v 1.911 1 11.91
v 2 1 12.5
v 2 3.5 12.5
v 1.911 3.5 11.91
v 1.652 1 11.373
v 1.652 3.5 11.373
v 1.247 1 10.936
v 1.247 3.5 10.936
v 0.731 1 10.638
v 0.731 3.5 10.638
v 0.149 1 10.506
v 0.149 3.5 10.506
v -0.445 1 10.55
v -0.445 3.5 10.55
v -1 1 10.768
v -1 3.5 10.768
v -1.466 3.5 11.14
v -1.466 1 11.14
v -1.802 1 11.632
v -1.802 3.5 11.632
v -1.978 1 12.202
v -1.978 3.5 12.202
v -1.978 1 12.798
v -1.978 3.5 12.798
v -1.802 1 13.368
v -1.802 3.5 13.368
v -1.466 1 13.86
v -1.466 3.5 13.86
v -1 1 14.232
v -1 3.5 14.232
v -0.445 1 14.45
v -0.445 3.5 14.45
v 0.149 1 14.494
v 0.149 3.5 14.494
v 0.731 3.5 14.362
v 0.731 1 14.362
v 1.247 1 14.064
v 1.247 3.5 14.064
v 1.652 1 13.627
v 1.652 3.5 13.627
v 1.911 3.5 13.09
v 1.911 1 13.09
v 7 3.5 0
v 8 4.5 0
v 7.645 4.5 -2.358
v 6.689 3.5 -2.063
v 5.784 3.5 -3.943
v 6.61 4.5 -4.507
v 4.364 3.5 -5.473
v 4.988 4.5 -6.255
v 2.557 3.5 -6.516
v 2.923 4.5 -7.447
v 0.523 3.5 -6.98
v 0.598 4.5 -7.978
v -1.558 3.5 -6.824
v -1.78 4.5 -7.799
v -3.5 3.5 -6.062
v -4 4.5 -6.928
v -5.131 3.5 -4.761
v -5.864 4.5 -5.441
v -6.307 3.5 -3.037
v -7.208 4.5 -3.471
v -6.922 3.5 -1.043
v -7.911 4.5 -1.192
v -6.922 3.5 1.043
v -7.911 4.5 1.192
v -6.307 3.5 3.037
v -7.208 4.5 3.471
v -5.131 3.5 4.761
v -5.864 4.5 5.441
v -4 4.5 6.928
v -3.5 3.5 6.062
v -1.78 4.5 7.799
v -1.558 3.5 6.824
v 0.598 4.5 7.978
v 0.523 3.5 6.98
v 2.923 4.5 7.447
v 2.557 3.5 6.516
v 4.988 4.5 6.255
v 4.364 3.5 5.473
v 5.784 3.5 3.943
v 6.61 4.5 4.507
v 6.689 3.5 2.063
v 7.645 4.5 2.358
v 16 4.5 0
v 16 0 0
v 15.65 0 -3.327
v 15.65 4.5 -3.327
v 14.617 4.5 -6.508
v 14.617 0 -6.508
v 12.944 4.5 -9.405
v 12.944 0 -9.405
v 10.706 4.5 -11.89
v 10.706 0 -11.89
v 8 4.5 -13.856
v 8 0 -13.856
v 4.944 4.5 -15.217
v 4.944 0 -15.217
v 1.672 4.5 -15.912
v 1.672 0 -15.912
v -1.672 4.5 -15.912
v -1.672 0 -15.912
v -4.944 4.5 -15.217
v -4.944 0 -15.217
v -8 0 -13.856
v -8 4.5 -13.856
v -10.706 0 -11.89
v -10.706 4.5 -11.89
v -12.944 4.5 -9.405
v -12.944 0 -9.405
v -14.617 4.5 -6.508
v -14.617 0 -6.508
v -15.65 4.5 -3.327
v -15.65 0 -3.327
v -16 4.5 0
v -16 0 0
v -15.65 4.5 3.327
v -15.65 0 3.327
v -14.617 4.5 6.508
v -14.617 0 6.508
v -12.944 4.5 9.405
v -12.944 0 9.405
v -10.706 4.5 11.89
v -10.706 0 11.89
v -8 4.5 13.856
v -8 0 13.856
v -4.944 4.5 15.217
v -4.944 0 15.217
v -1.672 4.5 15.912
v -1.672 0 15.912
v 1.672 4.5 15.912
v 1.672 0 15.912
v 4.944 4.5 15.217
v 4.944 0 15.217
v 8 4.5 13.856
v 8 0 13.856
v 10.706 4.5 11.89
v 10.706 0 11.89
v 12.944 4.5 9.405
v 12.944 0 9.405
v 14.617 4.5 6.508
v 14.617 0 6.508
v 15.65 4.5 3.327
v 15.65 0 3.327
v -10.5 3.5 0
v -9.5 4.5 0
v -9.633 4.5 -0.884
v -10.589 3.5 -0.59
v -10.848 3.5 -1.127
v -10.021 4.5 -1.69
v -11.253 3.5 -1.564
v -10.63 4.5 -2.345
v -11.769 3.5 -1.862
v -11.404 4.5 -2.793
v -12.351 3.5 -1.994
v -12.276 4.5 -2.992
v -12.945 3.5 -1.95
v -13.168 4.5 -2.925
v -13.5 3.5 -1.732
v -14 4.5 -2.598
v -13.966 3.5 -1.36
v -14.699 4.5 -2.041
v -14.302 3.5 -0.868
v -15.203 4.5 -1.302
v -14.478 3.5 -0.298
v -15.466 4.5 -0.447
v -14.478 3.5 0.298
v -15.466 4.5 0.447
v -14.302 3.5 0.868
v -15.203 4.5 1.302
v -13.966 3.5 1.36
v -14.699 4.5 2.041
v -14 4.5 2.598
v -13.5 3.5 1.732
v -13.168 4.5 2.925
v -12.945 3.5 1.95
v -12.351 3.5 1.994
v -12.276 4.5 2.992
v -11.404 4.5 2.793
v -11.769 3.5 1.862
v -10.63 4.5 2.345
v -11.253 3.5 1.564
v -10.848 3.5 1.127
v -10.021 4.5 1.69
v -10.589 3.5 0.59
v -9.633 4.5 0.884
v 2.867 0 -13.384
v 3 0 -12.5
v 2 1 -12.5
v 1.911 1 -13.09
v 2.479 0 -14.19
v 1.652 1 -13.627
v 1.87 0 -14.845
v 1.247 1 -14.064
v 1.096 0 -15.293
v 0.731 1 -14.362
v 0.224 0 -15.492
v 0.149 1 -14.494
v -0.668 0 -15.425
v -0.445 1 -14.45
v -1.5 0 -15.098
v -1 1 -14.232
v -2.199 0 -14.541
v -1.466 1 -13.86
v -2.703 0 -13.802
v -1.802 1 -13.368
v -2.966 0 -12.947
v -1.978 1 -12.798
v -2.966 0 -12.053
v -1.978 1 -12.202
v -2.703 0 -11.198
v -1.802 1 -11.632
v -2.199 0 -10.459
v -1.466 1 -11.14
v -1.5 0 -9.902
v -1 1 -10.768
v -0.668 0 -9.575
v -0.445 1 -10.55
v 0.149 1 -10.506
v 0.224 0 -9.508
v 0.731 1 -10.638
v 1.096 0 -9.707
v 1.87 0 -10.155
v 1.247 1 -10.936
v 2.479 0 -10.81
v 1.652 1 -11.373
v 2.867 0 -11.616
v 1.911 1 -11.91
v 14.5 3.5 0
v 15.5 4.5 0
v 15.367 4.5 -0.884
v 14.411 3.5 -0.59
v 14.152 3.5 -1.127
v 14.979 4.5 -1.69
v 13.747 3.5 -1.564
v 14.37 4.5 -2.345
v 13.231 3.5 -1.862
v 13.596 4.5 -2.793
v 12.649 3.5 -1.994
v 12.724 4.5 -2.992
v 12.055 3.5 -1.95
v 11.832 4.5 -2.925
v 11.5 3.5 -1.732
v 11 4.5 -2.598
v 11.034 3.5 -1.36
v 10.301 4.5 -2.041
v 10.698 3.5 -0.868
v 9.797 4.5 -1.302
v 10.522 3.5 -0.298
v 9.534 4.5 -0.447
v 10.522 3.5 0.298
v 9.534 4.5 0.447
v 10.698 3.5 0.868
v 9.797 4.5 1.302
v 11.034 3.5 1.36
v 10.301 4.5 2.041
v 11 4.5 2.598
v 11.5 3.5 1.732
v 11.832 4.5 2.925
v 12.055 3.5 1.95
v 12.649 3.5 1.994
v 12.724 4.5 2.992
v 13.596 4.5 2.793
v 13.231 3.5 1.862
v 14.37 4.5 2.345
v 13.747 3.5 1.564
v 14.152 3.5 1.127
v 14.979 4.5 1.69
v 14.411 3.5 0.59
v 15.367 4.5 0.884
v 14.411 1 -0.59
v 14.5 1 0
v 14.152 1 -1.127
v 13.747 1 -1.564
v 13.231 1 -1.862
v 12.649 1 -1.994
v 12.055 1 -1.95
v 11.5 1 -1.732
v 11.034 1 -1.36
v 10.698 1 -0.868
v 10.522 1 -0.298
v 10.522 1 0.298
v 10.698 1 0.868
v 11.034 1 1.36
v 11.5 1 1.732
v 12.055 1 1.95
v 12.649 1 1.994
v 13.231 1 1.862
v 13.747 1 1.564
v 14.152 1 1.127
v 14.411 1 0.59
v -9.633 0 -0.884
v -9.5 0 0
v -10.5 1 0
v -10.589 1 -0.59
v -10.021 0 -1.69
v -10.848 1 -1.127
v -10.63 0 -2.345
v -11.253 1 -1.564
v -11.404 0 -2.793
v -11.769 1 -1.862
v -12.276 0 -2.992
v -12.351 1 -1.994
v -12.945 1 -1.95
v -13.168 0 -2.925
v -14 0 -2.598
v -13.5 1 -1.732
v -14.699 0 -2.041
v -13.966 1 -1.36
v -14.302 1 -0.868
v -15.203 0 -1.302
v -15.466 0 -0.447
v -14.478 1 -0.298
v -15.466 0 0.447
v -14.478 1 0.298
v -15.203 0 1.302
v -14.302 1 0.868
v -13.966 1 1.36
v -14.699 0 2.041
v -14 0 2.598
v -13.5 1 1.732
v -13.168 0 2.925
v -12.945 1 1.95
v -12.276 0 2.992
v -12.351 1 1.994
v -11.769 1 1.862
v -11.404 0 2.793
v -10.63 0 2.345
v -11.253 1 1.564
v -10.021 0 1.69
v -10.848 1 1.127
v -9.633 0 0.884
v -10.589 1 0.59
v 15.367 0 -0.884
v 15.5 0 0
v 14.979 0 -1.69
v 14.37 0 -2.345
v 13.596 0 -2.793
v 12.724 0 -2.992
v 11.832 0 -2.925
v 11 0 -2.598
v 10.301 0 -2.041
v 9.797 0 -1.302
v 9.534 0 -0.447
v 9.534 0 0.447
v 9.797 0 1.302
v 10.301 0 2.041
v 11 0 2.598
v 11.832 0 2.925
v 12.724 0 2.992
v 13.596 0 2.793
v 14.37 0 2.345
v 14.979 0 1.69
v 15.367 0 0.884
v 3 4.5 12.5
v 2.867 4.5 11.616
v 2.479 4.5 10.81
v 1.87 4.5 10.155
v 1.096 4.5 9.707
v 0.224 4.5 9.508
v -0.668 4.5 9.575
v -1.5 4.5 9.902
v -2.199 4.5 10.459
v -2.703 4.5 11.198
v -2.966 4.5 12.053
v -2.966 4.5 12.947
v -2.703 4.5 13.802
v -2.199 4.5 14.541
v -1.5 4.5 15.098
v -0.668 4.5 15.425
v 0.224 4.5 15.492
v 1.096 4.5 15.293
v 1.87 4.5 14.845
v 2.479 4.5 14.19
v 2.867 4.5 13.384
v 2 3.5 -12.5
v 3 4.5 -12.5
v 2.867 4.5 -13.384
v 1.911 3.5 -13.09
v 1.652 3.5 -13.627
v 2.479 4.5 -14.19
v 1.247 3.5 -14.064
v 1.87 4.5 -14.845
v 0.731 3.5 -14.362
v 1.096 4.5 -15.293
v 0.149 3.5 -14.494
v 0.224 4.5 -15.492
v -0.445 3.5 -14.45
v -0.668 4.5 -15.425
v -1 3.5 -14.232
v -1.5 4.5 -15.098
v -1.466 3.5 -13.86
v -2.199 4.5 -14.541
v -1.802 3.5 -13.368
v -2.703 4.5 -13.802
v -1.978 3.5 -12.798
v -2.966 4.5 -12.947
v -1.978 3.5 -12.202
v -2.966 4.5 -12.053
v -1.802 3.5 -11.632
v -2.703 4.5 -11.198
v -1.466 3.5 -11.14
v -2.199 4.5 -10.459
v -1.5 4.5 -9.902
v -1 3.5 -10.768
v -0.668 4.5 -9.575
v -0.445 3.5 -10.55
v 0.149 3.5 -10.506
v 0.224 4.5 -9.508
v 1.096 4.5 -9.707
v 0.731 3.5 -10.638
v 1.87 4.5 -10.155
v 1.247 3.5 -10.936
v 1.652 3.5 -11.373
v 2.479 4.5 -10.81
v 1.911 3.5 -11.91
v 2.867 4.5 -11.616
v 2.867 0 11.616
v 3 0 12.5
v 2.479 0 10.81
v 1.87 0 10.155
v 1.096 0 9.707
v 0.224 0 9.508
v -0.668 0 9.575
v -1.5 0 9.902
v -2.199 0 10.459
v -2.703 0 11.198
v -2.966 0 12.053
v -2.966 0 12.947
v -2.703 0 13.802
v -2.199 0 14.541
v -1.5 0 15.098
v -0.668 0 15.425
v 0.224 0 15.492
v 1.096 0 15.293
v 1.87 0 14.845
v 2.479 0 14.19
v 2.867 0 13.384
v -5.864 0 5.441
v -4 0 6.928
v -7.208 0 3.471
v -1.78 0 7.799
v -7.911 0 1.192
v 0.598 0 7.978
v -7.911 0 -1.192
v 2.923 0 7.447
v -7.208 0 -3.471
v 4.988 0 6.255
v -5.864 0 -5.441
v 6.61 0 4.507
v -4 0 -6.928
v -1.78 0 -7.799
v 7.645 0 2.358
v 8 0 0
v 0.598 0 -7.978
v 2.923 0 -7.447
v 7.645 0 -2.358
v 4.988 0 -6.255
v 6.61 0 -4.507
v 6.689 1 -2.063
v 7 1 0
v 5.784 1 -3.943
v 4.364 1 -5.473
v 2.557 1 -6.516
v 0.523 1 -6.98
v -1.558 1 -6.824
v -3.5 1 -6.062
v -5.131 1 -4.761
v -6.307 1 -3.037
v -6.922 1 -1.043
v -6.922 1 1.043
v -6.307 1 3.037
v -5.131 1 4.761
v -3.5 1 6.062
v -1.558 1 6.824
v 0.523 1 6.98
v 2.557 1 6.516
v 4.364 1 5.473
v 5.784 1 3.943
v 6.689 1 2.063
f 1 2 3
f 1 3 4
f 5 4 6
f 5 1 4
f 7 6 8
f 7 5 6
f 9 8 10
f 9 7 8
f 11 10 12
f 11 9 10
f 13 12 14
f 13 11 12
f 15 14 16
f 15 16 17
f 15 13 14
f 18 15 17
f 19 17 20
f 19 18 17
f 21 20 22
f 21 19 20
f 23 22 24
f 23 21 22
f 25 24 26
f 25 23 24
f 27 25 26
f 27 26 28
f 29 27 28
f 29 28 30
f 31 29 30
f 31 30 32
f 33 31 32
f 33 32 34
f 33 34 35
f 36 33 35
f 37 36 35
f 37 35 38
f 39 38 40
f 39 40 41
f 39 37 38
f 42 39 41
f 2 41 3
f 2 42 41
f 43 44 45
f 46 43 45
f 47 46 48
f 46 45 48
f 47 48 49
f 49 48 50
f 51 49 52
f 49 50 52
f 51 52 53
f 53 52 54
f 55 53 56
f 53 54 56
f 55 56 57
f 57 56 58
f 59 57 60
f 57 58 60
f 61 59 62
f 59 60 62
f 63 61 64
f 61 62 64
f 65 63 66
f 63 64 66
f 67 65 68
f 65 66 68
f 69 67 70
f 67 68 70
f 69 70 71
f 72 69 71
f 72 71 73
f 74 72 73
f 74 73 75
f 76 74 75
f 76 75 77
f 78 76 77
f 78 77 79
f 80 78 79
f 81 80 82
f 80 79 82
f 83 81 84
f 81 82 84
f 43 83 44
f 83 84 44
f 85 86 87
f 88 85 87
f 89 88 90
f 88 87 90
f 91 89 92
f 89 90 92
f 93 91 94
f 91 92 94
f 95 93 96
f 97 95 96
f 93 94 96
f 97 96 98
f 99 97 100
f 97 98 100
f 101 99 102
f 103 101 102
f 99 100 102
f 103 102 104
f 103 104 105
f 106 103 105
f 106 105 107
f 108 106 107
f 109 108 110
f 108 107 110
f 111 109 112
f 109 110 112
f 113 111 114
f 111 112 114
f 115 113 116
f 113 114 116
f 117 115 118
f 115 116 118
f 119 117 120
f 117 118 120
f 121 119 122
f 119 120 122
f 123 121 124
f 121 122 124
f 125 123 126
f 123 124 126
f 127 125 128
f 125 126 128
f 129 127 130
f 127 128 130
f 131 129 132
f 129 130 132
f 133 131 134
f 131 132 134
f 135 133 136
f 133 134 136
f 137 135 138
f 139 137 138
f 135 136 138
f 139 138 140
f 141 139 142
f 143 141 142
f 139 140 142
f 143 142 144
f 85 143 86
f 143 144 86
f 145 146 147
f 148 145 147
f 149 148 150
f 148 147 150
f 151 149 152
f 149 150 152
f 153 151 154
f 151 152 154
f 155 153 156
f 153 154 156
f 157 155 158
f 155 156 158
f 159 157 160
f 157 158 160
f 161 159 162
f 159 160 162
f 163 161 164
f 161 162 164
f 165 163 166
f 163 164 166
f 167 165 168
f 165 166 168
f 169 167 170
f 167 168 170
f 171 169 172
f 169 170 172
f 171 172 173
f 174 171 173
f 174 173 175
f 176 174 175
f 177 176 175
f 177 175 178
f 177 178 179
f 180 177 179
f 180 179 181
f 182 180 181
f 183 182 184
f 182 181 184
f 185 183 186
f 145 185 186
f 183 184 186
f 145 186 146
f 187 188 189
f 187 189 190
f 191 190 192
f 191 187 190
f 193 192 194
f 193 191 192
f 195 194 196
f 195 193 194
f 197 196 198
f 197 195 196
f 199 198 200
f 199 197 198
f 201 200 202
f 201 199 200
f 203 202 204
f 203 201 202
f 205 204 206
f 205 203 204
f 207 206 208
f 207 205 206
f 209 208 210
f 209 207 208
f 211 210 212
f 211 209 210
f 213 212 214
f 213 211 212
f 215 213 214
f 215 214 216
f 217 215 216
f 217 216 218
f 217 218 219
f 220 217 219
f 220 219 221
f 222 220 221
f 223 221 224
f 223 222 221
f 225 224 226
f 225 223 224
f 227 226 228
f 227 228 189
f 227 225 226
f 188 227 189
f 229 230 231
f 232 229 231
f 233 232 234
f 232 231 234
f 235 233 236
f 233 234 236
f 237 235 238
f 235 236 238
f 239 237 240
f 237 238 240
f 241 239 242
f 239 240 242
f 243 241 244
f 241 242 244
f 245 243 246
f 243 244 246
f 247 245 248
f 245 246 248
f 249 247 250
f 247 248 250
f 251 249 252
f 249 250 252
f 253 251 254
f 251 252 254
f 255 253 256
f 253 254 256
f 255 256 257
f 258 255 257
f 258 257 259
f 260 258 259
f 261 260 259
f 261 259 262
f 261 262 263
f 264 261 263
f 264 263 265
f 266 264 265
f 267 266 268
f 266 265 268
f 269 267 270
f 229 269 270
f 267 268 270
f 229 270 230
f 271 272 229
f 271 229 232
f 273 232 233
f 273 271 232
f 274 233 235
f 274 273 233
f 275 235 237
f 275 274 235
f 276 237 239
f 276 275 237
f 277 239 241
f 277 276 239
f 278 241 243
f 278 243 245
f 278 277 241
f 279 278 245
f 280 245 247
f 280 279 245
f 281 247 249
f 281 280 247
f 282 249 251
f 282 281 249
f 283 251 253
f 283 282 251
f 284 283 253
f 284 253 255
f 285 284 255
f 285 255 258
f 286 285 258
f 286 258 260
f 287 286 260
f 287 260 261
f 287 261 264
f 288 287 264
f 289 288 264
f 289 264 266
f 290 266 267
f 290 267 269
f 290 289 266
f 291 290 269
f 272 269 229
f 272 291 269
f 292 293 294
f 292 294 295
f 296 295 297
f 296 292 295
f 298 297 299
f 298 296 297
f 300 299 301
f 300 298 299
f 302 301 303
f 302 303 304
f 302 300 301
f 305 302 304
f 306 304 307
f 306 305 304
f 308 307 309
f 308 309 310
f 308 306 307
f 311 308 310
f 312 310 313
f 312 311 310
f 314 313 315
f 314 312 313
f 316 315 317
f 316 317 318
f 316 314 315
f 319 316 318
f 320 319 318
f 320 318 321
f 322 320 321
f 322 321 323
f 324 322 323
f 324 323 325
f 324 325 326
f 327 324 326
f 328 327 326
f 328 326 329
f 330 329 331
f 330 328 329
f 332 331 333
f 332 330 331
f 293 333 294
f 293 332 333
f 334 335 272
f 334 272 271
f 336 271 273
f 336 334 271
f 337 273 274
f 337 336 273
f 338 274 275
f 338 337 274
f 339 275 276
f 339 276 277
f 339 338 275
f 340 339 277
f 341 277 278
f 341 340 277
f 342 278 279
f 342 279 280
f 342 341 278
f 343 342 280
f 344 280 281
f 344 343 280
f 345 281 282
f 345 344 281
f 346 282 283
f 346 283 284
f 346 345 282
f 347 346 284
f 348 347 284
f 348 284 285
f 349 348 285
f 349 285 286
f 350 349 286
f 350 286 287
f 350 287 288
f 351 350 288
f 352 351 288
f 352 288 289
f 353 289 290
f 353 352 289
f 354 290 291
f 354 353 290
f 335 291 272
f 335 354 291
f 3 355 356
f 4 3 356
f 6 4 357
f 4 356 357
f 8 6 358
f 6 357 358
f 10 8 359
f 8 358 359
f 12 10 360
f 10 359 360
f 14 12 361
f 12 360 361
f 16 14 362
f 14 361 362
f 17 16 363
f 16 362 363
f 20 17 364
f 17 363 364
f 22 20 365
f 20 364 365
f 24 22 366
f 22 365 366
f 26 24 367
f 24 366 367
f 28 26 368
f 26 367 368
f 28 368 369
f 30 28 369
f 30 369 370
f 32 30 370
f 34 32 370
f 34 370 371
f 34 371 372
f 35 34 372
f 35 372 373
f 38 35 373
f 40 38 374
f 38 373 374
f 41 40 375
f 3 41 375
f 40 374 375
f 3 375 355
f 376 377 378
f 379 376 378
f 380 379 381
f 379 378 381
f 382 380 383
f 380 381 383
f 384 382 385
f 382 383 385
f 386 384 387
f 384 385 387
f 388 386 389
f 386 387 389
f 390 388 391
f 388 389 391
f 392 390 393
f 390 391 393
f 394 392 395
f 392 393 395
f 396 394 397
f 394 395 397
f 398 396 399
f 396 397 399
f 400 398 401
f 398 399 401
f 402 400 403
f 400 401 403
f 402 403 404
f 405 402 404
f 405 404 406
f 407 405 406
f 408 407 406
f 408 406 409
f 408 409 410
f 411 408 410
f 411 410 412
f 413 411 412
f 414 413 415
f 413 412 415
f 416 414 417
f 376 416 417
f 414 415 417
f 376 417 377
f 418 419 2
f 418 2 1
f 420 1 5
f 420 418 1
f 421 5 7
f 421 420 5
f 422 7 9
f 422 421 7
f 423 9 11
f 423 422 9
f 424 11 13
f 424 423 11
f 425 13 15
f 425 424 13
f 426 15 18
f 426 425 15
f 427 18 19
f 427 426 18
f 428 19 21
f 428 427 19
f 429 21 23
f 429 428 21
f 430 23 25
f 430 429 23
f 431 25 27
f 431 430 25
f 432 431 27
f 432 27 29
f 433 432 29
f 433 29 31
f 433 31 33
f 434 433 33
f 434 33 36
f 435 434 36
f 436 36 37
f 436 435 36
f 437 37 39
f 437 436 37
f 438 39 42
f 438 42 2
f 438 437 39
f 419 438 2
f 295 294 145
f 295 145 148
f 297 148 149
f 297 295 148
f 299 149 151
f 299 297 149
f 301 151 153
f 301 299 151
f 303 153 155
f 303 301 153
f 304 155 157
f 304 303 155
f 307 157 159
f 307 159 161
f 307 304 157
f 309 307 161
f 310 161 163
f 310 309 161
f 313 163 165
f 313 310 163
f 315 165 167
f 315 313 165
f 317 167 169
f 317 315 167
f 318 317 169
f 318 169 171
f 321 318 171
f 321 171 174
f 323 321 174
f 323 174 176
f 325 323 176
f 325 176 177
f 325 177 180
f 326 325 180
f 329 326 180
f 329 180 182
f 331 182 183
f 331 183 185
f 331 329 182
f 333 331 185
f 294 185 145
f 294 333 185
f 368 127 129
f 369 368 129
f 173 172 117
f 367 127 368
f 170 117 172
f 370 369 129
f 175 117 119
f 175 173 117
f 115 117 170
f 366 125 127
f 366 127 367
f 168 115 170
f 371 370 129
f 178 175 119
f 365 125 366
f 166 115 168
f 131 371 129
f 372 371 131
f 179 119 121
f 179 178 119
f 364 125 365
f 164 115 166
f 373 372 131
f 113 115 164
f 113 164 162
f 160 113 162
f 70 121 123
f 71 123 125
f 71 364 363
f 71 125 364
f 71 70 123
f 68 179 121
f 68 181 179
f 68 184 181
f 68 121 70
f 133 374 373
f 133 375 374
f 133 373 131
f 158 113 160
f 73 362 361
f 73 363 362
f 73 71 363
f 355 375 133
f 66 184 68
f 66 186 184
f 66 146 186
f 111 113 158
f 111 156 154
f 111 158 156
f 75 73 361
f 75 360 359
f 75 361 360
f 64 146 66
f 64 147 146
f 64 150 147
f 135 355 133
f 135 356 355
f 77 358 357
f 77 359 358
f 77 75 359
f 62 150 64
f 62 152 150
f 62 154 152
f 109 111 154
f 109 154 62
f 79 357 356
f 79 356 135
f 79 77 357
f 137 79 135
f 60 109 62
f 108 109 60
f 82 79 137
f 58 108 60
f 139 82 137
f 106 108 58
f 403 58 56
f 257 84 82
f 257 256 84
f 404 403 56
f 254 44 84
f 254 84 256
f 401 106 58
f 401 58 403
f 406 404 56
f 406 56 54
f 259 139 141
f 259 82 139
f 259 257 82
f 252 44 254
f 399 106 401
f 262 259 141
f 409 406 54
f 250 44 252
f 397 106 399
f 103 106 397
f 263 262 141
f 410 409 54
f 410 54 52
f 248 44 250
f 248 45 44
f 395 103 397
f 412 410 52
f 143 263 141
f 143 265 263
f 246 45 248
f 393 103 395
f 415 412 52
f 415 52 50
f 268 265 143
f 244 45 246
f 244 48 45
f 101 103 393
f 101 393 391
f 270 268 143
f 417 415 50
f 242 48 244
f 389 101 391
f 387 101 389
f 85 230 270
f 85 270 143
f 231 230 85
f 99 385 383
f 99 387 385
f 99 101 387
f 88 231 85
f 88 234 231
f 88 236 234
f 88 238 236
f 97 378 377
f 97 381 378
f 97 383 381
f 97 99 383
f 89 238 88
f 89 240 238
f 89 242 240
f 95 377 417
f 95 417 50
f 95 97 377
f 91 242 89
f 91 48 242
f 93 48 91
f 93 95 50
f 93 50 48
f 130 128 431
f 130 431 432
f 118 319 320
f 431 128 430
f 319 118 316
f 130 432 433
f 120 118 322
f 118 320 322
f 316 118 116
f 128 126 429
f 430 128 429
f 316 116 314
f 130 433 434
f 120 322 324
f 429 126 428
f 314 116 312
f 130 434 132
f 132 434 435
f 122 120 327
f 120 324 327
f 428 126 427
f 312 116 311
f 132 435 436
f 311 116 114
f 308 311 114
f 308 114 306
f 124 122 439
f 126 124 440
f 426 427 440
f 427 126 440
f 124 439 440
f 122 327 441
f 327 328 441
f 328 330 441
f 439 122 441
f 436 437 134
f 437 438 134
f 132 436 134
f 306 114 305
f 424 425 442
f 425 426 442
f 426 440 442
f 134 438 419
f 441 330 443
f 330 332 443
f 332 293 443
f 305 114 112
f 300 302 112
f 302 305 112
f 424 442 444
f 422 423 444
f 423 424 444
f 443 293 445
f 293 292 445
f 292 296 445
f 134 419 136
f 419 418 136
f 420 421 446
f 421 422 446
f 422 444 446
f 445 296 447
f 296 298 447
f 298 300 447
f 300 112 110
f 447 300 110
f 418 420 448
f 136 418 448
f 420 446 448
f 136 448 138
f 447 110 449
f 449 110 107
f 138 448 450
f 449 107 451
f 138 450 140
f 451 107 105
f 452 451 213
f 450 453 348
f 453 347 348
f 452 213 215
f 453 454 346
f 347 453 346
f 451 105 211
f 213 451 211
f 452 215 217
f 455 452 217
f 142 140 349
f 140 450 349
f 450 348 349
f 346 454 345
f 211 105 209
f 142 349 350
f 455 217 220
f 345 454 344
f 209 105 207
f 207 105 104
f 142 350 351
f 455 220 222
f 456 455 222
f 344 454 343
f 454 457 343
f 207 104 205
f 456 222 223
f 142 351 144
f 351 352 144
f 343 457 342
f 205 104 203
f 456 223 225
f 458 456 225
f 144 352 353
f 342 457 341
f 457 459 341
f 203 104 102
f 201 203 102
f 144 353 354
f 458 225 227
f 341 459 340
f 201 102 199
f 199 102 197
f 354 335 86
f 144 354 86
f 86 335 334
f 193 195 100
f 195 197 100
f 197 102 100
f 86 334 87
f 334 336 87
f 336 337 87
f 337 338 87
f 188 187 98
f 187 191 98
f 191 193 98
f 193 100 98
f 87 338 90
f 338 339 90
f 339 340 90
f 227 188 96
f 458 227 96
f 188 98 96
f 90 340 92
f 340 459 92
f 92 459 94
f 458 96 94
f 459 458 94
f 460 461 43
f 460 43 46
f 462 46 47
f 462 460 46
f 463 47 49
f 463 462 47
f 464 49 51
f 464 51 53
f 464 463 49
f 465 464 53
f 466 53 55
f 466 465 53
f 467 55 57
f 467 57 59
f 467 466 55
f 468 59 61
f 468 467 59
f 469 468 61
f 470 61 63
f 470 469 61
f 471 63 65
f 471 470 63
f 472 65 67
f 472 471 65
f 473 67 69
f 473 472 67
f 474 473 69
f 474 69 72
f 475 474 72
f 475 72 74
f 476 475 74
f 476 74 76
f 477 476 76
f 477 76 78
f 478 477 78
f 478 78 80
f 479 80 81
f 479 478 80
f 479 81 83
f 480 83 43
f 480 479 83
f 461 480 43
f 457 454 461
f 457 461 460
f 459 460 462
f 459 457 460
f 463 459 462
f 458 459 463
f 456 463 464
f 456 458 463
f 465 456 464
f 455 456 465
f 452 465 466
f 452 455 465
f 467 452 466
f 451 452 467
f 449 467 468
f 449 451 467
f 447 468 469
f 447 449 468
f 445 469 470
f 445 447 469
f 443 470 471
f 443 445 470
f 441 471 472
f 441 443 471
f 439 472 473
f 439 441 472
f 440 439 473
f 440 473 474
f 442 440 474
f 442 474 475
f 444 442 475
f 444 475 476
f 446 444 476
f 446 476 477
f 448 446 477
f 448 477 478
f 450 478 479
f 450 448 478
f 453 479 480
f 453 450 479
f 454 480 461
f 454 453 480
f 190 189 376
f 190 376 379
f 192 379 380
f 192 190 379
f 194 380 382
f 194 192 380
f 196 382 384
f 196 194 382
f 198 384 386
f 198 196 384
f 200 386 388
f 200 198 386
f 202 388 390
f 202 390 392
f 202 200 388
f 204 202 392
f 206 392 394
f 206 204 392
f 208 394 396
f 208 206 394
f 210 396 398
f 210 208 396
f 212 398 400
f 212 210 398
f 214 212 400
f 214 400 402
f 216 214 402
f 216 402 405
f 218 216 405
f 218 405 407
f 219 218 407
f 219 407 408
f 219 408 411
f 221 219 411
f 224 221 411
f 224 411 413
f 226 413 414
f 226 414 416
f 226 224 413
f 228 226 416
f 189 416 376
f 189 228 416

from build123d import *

# Parameters (mm, degrees)
SKETCH1_R           = 16
SKETCH1_R_2         = 7
SKETCH1_R_3         = 2
BOSS_EXTRUDE1_DEPTH = 4.5
CHAMFER1_SIZE       = 1


with BuildPart() as part:
    # Sketch1 → Boss-Extrude1 (new body)
    with BuildSketch(Plane(origin=(0, 0, 0), x_dir=(1, 0, 0), z_dir=(0, 1, 0))):
        Circle(SKETCH1_R)
        Circle(SKETCH1_R_2, mode=Mode.SUBTRACT)
        with Locations((0, 12.5)):
            Circle(SKETCH1_R_3, mode=Mode.SUBTRACT)
        with Locations((12.5, 0)):
            Circle(SKETCH1_R_3, mode=Mode.SUBTRACT)
        with Locations((0, -12.5)):
            Circle(SKETCH1_R_3, mode=Mode.SUBTRACT)
        with Locations((-12.5, 0)):
            Circle(SKETCH1_R_3, mode=Mode.SUBTRACT)
    extrude(amount=BOSS_EXTRUDE1_DEPTH)

    # Chamfer1
    chamfer1_edges = [part.edges().sort_by_distance(p)[0] for p in [
        (10.5, 0, 0),
        (10.5, 4.5, 0),
        (-2, 0, 12.5),
        (-2, 4.5, 12.5),
        (-14.5, 0, 0),
        (-14.5, 4.5, 0),
        (-7, 0, 0),
        (-7, 4.5, 0),
        (-2, 0, -12.5),
        (-2, 4.5, -12.5),
    ]]
    chamfer(chamfer1_edges, length=CHAMFER1_SIZE)


solid = part.part
